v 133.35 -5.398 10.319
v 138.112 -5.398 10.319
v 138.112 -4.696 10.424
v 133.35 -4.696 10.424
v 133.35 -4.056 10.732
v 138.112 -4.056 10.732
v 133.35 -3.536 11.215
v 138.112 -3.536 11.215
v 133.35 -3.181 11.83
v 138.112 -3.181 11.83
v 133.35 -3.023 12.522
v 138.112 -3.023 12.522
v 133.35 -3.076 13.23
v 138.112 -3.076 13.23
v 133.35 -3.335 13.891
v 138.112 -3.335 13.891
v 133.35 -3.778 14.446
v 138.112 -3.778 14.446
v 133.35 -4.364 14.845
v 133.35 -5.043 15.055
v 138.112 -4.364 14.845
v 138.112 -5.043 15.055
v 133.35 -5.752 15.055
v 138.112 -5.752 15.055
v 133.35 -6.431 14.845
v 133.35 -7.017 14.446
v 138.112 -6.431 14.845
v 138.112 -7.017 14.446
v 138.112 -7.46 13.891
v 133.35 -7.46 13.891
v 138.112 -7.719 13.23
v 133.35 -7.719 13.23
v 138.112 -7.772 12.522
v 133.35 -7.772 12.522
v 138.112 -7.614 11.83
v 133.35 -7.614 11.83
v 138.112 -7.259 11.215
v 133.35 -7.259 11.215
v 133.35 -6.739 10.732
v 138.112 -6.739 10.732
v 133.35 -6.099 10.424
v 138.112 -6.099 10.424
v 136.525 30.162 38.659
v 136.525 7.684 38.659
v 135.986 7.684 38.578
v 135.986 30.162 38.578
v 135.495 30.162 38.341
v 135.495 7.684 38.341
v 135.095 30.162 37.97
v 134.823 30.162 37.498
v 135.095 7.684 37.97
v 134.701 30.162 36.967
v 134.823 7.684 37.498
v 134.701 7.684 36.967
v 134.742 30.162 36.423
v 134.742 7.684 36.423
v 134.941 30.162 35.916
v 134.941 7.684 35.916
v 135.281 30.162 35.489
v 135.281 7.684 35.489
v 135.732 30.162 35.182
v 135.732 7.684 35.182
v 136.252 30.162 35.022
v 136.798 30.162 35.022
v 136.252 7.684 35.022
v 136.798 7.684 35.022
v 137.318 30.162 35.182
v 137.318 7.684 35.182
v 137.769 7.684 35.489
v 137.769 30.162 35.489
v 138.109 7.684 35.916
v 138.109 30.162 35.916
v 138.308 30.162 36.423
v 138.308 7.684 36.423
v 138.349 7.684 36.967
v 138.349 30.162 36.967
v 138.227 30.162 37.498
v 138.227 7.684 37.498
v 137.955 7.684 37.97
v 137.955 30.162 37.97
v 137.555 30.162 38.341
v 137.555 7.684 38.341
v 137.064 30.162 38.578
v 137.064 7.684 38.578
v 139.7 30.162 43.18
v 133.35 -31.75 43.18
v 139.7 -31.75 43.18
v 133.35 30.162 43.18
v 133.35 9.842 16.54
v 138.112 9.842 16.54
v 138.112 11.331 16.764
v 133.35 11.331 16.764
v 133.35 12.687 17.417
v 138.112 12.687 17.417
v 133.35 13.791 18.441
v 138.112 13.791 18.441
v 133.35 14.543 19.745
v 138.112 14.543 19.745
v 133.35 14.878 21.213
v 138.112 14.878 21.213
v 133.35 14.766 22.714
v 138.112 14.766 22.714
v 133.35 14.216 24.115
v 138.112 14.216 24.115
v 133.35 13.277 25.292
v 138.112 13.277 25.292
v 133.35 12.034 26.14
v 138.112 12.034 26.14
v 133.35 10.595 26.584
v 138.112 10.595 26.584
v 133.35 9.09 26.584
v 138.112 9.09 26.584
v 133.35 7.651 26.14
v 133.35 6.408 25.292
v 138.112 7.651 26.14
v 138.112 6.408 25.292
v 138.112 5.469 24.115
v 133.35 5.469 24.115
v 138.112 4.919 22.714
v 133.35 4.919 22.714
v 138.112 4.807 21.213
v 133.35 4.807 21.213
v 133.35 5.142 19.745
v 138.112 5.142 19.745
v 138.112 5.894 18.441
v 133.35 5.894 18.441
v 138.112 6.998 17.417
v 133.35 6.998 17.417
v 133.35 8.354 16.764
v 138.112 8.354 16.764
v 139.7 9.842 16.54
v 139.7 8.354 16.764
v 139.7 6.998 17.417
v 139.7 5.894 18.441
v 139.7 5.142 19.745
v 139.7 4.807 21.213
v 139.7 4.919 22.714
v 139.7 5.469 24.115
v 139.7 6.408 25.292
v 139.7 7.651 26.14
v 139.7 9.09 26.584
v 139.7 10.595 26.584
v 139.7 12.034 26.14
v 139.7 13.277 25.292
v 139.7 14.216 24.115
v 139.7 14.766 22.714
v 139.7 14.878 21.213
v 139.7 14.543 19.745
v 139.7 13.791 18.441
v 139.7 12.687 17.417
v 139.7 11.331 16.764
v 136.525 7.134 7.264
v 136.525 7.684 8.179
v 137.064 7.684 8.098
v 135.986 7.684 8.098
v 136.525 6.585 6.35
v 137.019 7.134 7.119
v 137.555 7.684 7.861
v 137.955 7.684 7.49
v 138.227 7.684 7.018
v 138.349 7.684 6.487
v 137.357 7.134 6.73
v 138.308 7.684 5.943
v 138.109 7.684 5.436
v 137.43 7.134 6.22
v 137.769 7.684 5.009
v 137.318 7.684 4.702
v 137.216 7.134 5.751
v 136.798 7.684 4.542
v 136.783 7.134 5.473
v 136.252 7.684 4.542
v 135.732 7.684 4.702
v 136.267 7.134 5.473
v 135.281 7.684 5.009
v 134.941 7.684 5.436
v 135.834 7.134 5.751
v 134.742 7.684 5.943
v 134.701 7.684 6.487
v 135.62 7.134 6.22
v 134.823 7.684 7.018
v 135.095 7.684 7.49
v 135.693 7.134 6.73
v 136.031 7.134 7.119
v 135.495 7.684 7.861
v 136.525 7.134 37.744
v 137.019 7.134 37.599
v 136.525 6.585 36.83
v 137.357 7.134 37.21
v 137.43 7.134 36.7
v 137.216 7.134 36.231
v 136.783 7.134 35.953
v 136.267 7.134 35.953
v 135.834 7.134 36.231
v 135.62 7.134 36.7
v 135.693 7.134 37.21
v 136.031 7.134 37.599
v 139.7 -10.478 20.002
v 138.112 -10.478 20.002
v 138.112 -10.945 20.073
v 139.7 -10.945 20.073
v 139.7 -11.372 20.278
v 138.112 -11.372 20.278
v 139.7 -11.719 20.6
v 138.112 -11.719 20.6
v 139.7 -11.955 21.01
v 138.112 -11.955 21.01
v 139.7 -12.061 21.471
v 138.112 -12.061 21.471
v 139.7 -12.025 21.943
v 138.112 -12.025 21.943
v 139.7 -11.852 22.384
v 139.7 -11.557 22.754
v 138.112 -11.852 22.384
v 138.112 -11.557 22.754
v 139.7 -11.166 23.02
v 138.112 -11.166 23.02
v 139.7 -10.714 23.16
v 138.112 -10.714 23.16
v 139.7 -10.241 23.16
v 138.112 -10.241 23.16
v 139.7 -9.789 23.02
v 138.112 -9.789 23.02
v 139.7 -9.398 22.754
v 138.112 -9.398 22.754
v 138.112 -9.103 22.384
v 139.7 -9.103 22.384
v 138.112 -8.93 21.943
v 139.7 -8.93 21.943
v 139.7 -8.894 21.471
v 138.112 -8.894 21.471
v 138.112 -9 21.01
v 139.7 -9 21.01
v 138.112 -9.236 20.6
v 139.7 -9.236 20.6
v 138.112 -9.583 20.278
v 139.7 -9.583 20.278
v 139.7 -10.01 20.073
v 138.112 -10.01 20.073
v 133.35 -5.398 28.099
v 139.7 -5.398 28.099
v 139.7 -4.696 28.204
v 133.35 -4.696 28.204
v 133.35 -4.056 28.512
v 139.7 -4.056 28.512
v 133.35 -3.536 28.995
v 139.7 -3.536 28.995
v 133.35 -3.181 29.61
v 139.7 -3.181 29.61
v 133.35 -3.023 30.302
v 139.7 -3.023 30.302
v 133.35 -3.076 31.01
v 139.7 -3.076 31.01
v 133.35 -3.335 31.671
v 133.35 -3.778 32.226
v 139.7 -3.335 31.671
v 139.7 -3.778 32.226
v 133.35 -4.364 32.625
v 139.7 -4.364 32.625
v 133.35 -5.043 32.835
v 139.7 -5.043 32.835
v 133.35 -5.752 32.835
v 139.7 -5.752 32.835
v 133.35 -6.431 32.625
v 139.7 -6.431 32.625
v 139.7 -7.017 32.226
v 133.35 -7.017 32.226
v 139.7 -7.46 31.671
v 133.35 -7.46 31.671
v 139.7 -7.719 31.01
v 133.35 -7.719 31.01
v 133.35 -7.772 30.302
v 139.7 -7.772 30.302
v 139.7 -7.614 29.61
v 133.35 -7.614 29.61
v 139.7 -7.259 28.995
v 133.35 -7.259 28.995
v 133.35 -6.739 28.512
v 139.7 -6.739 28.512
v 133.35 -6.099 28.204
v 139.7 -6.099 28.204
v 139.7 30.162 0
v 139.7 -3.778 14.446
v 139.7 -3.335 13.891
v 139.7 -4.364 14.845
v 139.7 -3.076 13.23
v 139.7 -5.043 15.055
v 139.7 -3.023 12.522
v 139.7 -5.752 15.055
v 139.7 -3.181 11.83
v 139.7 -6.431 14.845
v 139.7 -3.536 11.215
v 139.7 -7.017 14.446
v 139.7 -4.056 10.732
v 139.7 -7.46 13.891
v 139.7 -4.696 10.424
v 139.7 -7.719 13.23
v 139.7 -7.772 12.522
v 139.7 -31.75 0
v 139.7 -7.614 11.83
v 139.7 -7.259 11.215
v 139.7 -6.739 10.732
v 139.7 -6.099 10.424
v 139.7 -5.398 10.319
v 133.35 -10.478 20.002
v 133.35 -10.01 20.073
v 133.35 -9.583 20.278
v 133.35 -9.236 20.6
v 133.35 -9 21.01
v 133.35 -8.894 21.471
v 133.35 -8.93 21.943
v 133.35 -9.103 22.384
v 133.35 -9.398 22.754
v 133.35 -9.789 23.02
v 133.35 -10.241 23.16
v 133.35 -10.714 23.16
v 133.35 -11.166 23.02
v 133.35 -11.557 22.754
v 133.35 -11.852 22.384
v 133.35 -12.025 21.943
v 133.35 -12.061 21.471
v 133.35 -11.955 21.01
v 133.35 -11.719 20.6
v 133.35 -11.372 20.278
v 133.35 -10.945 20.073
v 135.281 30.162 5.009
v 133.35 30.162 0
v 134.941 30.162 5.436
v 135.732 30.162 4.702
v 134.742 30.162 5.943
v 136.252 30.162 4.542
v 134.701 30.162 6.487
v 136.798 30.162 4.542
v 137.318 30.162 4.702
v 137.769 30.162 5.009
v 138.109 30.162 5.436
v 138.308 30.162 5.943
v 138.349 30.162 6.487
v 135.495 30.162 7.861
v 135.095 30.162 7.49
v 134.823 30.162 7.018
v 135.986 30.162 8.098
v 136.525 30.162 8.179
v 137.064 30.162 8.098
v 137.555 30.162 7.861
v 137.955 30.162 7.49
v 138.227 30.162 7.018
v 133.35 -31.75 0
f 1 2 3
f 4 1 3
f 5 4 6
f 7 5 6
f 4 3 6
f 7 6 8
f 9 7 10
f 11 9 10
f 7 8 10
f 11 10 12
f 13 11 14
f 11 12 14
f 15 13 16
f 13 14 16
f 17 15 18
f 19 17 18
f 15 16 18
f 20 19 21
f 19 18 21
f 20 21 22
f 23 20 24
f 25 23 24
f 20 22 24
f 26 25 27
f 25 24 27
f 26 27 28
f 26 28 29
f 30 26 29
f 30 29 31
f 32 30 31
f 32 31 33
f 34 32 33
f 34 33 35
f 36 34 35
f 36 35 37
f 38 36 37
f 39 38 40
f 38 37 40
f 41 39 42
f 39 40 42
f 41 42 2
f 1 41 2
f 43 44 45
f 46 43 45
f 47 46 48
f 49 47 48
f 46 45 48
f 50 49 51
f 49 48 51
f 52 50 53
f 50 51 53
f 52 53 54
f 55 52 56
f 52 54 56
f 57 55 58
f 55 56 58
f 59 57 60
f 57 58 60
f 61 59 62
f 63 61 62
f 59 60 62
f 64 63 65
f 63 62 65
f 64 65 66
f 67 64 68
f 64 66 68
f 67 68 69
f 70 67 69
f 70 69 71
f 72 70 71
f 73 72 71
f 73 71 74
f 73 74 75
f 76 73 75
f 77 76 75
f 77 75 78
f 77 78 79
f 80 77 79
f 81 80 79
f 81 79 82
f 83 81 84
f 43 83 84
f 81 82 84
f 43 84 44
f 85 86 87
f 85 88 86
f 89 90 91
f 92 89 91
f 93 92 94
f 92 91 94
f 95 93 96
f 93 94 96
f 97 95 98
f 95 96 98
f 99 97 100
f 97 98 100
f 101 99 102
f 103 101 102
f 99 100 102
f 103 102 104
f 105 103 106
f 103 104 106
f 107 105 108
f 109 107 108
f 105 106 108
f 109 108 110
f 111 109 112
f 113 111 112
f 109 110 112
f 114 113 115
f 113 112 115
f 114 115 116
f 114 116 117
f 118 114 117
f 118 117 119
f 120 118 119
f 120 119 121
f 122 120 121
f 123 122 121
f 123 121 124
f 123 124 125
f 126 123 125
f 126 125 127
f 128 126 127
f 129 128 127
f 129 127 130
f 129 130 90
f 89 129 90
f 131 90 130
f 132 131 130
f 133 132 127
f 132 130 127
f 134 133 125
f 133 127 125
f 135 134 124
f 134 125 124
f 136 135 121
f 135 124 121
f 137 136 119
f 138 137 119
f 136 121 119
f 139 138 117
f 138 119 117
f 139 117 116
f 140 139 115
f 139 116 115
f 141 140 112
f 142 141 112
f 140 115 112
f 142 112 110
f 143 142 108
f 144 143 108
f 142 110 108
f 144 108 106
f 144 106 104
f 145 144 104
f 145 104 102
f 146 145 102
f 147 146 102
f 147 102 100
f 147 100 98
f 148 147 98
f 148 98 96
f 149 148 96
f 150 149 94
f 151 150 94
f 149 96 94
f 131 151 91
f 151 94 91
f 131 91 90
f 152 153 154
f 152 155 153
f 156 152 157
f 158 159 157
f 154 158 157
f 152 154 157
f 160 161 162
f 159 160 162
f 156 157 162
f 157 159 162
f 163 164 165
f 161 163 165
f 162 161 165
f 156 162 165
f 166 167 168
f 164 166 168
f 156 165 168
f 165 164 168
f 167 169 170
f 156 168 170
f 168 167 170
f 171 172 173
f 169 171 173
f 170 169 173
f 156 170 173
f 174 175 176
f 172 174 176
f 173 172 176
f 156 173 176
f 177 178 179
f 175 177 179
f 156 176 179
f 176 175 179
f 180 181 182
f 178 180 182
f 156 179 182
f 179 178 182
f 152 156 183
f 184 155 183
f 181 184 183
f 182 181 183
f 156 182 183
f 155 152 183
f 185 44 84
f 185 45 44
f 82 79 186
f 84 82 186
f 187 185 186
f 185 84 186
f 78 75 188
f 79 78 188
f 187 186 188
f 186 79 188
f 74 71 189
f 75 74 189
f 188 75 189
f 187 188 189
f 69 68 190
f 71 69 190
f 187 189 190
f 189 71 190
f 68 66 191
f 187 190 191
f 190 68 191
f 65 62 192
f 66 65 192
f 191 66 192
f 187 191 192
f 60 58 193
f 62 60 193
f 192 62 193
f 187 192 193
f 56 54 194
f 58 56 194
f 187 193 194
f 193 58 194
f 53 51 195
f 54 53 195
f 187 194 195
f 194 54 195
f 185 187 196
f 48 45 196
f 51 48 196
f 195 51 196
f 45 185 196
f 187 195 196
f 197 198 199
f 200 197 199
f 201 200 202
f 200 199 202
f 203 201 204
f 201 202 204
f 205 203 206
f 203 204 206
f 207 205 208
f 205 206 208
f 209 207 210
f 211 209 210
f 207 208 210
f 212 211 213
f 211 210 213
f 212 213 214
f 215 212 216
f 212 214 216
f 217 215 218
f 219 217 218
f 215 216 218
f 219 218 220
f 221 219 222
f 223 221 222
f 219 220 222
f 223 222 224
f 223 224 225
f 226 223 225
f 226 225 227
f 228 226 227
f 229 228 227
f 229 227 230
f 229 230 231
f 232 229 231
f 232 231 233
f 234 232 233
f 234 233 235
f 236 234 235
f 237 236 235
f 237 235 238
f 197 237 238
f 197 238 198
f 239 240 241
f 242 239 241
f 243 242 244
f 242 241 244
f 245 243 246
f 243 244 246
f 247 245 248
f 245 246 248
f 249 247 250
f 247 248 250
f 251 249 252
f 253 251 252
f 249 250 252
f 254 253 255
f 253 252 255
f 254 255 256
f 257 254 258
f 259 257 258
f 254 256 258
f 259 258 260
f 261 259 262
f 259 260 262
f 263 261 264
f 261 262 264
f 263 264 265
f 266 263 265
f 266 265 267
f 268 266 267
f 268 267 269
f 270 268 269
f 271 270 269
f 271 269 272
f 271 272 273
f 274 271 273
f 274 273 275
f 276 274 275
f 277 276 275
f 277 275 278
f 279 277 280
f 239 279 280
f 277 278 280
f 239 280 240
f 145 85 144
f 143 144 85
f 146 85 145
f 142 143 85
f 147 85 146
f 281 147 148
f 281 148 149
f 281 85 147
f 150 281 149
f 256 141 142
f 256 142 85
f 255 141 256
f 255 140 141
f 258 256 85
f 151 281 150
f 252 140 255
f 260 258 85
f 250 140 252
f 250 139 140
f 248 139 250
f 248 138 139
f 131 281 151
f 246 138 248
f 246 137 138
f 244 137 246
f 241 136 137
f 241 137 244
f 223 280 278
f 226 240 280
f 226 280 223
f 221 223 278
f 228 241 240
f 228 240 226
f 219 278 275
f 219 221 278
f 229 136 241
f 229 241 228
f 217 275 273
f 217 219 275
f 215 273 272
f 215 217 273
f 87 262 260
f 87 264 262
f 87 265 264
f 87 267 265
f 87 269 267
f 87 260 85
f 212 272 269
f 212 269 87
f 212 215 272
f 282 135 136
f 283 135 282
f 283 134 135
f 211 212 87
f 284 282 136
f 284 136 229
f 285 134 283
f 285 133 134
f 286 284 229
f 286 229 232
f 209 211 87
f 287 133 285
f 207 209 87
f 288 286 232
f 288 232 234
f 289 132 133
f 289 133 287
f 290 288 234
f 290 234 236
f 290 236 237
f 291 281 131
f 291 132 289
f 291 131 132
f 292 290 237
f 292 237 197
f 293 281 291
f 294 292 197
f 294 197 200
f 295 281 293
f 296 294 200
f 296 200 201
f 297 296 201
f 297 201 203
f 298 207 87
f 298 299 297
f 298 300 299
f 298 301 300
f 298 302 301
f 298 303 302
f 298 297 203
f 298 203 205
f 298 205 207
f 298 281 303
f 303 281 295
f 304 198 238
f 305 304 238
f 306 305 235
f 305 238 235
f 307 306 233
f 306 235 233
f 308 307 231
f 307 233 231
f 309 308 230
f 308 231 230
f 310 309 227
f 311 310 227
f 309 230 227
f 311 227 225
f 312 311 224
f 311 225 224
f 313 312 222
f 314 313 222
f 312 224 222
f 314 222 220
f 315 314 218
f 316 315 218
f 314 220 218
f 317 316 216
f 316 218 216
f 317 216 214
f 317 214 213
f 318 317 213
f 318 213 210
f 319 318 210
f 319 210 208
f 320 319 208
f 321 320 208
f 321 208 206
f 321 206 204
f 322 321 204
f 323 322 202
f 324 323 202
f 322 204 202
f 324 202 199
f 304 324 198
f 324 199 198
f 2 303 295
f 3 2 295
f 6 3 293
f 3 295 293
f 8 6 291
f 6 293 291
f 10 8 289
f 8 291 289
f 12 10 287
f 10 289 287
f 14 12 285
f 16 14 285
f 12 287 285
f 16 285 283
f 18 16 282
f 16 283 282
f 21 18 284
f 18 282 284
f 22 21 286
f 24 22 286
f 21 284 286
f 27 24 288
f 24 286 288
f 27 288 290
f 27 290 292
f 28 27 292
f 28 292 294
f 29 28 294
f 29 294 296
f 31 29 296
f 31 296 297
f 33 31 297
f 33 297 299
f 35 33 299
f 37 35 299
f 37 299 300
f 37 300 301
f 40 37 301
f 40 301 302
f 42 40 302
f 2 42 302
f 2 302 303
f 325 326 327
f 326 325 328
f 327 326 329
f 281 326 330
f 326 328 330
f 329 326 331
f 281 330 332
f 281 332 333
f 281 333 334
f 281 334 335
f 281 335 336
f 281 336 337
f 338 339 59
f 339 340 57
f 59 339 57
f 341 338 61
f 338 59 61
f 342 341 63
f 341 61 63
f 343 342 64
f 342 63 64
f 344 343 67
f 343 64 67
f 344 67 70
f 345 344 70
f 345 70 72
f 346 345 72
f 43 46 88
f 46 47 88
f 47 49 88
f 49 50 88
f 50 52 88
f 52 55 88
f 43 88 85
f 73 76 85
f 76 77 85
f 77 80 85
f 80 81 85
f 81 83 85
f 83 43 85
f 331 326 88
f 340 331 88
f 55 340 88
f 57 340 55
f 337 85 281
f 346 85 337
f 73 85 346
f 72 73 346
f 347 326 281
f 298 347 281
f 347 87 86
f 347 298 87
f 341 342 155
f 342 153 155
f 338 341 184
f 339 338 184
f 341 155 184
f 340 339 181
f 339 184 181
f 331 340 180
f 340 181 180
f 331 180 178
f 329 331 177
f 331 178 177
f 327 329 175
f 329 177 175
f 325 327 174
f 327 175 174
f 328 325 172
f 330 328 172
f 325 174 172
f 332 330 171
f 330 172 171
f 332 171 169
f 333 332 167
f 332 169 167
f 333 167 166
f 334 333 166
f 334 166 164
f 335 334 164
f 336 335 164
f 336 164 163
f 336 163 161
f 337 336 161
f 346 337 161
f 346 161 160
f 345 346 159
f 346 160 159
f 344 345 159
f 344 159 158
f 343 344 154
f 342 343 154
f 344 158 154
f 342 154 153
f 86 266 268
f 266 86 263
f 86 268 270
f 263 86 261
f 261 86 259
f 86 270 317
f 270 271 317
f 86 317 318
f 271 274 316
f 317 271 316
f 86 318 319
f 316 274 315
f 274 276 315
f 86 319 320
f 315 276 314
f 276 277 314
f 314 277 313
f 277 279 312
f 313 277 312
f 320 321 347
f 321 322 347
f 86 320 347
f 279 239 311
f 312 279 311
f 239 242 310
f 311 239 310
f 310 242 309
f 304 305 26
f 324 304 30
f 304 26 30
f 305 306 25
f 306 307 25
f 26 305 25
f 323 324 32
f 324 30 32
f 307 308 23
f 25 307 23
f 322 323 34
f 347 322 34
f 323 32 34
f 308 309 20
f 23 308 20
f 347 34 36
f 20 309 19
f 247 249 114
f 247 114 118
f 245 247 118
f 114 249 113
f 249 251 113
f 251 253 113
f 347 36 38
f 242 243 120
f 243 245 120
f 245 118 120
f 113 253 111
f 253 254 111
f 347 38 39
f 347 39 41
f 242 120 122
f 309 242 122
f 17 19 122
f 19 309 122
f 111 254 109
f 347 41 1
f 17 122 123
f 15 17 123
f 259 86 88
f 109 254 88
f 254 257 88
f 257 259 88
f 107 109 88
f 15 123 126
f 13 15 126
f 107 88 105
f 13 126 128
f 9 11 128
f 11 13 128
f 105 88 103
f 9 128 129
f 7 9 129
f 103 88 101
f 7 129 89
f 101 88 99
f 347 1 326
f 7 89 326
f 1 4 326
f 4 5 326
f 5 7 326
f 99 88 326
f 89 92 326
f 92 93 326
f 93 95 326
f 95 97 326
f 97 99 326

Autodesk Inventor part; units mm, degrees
ref_plane "YZ Plane" through (0, 0, 0) normal (1, 0, 0) x (0, 1, 0)
ref_plane "XZ Plane" through (0, 0, 0) normal (0, 1, 0) x (-1, 0, 0)
ref_plane "XY Plane" through (0, 0, 0) normal (0, 0, 1) x (1, 0, 0)
sketch "Sketch1" plane through (0, 0, 0) normal (0, 0, 1) x (1, 0, 0)
  line L0 (-139.7, 31.75) -> (139.7, 31.75)
  line L1 (139.7, 31.75) -> (139.7, -31.75)
  line L2 (139.7, -31.75) -> (-139.7, -31.75)
  line L3 (-139.7, -31.75) -> (-139.7, 31.75)
  point P0 (0, 0)
  point P1 (0, 31.75)
  point P2 (139.7, 0)
  dimension "d0" = 279.4
  dimension "d1" = 63.5
extrude "Extrusion1" add sketch "Sketch1" along normal blind 43.18
sketch "Sketch2" plane through (0, 0, 43.18) normal (0, 0, 1) x (1, 0, 0)
  line L0 (-139.7, -31.75) -> (139.7, -31.75) projected
  line L1 (-138.1125, 30.1625) -> (138.1125, 30.1625)
  line L2 (138.1125, 30.1625) -> (138.1125, -31.75)
  line L3 (138.1125, -31.75) -> (-138.1125, -31.75)
  line L4 (-138.1125, -31.75) -> (-138.1125, 30.1625)
  line L5 (139.7, -31.75) -> (139.7, 31.75) projected
  line L6 (139.7, 31.75) -> (-139.7, 31.75) projected
  line L7 (-139.7, 31.75) -> (-139.7, -31.75) projected
  point P0 (0, 0)
  point P1 (-138.1125, -31.75)
  dimension "d4" = 1.5875
  dimension "d5" = 1.5875
  dimension "d6" = 1.5875
extrude "Extrusion2" cut sketch "Sketch2" against normal up to surface (43.18 mm away) contours L4 L1 L2 L0
sketch "Sketch3" plane through (-138.1125, -31.75, 43.18) normal (1, 0, 0) x (0, 0, -1)
  circle A0 centre (21.59, 41.5925) radius 5.05
  line L0 (0, 61.9125) -> (43.18, 61.9125) projected
  circle A1 centre (21.59, 21.2725) radius 1.5875
  line L1 (43.18, 63.5) -> (0, 63.5) projected
  point P0 (43.18, 31.75)
  point P1 (21.59, 63.5)
  dimension "d9" = 10.1
  dimension "d10" = 20.32
  dimension "d13" = 3.175
  dimension "d15" = 20.32
extrude "Extrusion3" cut sketch "Sketch3" along normal through all both and the other way through all
sketch "Sketch4" plane through (139.7, -31.75, 0) normal (1, 0, 0) x (0, 0, -1)
  circle A0 centre (-12.7, 26.3525) radius 2.3813
  line L0 (0, 63.5) -> (-43.18, 63.5) construction
  line L1 (-21.59, 63.5) -> (-21.59, -3.1611) construction
  line L2 (0, 0) -> (0, 63.5) projected
  circle A1 centre (-21.59, 41.5925) radius 5.05 projected
  circle A2 centre (-30.48, 26.3525) radius 2.3813
  point P0 (0, 31.75)
  dimension "d16" = 12.7
  dimension "d17" = 15.24
  dimension "d18" = 4.7625
extrude "Extrusion4" cut sketch "Sketch4" against normal up to surface (1.5875 mm away) contours A0 | A2
sketch "Sketch5" plane through (-139.7, -31.75, 0) normal (-1, 0, 0) x (0, 0, 1)
  circle A0 centre (21.59, 41.5925) radius 5.05 construction
  line L0 (21.59, 41.5925) -> (21.59, 66.4825) construction
  line L1 (21.59, 41.5925) -> (51.2225, 41.5925) construction
  circle A1 centre (37.09, 57.0925) radius 1.5875
  circle A2 centre (6.09, 57.0925) radius 1.5875
  circle A3 centre (37.09, 26.0925) radius 1.5875
  circle A4 centre (6.09, 26.0925) radius 1.5875
  point P0 (0, 31.75)
  dimension "d21" = 3.175
  dimension "d22" = 15.5
  dimension "d23" = 15.5
extrude "Extrusion5" cut sketch "Sketch5" against normal up to surface (1.5875 mm away)
sketch "Sketch6" plane through (0, 0, 43.18) normal (0, 0, 1) x (1, 0, 0)
  line L0 (138.1125, 30.1625) -> (138.1125, -31.75) projected
  line L1 (138.1125, 30.1625) -> (147.9517, 30.1625)
  line L2 (147.9517, 30.1625) -> (147.9517, 39.5232)
  line L3 (147.9517, 39.5232) -> (138.1125, 39.5232)
  line L4 (138.1125, 39.5232) -> (138.1125, 30.1625)
  line L5 (138.1125, 30.1625) -> (-192.5476, 30.1625)
  line L6 (-192.5476, 30.1625) -> (-192.5476, 49.9994)
  line L7 (-192.5476, 49.9994) -> (138.1125, 49.9994)
  line L8 (138.1125, 49.9994) -> (138.1125, 30.1625)
  line L9 (-192.5476, 30.1625) -> (-74.3706, 30.1625)
  line L10 (-74.3706, 30.1625) -> (-74.3706, -79.1708)
  line L11 (-74.3706, -79.1708) -> (-192.5476, -79.1708)
  line L12 (-192.5476, -79.1708) -> (-192.5476, 30.1625)
  point P0 (0, 0)
extrude "Extrusion6" cut sketch "Sketch6" against normal through all
sketch "Sketch7" plane through (139.7, -31.75, 43.18) normal (1, 0, 0) x (0, 0, -1)
  line L0 (43.18, 61.9125) -> (0, 61.9125) projected
  line L1 (0, 0) -> (0, 61.9125) projected
  line L2 (43.18, 0) -> (0, 0) projected
  line L3 (43.18, 0) -> (43.18, 61.9125) projected
  circle A0 centre (21.59, 21.2725) radius 1.5875 projected
  circle A1 centre (21.59, 41.5925) radius 5.05 projected
  circle A2 centre (30.48, 26.3525) radius 2.3813 projected
  circle A3 centre (12.7, 26.3525) radius 2.3813 projected
  point P0 (43.18, 31.75)
extrude "Extrusion7" add sketch "Sketch7" against normal blind 6.35
sketch "Sketch8" plane through (139.7, 30.1625, 43.18) normal (0, 1, 0) x (1, 0, 0)
  line L0 (-6.35, 0) -> (0, 0) projected
  line L1 (-6.35, 0) -> (0, 0)
  line L2 (-3.175, 0) -> (-3.175, 6.35)
  line L3 (-6.35, 43.18) -> (0, 43.18) projected
  line L4 (-3.175, 43.18) -> (-3.175, 36.83)
  point P0 (-139.7, 43.18)
  dimension "d30" = 6.35
  dimension "d31" = 6.35
hole "Hole1" at (136.525, 30.1625, 36.83) at (136.525, 30.1625, 6.35) direction (0, -1, 0) diameter 3.6576 depth 22.479 tip angle 118 clearance for "Hex Machine Screw" size "#6" standard "Ansi Unified Screw Threads"
properties part number "Bracket(right)"
